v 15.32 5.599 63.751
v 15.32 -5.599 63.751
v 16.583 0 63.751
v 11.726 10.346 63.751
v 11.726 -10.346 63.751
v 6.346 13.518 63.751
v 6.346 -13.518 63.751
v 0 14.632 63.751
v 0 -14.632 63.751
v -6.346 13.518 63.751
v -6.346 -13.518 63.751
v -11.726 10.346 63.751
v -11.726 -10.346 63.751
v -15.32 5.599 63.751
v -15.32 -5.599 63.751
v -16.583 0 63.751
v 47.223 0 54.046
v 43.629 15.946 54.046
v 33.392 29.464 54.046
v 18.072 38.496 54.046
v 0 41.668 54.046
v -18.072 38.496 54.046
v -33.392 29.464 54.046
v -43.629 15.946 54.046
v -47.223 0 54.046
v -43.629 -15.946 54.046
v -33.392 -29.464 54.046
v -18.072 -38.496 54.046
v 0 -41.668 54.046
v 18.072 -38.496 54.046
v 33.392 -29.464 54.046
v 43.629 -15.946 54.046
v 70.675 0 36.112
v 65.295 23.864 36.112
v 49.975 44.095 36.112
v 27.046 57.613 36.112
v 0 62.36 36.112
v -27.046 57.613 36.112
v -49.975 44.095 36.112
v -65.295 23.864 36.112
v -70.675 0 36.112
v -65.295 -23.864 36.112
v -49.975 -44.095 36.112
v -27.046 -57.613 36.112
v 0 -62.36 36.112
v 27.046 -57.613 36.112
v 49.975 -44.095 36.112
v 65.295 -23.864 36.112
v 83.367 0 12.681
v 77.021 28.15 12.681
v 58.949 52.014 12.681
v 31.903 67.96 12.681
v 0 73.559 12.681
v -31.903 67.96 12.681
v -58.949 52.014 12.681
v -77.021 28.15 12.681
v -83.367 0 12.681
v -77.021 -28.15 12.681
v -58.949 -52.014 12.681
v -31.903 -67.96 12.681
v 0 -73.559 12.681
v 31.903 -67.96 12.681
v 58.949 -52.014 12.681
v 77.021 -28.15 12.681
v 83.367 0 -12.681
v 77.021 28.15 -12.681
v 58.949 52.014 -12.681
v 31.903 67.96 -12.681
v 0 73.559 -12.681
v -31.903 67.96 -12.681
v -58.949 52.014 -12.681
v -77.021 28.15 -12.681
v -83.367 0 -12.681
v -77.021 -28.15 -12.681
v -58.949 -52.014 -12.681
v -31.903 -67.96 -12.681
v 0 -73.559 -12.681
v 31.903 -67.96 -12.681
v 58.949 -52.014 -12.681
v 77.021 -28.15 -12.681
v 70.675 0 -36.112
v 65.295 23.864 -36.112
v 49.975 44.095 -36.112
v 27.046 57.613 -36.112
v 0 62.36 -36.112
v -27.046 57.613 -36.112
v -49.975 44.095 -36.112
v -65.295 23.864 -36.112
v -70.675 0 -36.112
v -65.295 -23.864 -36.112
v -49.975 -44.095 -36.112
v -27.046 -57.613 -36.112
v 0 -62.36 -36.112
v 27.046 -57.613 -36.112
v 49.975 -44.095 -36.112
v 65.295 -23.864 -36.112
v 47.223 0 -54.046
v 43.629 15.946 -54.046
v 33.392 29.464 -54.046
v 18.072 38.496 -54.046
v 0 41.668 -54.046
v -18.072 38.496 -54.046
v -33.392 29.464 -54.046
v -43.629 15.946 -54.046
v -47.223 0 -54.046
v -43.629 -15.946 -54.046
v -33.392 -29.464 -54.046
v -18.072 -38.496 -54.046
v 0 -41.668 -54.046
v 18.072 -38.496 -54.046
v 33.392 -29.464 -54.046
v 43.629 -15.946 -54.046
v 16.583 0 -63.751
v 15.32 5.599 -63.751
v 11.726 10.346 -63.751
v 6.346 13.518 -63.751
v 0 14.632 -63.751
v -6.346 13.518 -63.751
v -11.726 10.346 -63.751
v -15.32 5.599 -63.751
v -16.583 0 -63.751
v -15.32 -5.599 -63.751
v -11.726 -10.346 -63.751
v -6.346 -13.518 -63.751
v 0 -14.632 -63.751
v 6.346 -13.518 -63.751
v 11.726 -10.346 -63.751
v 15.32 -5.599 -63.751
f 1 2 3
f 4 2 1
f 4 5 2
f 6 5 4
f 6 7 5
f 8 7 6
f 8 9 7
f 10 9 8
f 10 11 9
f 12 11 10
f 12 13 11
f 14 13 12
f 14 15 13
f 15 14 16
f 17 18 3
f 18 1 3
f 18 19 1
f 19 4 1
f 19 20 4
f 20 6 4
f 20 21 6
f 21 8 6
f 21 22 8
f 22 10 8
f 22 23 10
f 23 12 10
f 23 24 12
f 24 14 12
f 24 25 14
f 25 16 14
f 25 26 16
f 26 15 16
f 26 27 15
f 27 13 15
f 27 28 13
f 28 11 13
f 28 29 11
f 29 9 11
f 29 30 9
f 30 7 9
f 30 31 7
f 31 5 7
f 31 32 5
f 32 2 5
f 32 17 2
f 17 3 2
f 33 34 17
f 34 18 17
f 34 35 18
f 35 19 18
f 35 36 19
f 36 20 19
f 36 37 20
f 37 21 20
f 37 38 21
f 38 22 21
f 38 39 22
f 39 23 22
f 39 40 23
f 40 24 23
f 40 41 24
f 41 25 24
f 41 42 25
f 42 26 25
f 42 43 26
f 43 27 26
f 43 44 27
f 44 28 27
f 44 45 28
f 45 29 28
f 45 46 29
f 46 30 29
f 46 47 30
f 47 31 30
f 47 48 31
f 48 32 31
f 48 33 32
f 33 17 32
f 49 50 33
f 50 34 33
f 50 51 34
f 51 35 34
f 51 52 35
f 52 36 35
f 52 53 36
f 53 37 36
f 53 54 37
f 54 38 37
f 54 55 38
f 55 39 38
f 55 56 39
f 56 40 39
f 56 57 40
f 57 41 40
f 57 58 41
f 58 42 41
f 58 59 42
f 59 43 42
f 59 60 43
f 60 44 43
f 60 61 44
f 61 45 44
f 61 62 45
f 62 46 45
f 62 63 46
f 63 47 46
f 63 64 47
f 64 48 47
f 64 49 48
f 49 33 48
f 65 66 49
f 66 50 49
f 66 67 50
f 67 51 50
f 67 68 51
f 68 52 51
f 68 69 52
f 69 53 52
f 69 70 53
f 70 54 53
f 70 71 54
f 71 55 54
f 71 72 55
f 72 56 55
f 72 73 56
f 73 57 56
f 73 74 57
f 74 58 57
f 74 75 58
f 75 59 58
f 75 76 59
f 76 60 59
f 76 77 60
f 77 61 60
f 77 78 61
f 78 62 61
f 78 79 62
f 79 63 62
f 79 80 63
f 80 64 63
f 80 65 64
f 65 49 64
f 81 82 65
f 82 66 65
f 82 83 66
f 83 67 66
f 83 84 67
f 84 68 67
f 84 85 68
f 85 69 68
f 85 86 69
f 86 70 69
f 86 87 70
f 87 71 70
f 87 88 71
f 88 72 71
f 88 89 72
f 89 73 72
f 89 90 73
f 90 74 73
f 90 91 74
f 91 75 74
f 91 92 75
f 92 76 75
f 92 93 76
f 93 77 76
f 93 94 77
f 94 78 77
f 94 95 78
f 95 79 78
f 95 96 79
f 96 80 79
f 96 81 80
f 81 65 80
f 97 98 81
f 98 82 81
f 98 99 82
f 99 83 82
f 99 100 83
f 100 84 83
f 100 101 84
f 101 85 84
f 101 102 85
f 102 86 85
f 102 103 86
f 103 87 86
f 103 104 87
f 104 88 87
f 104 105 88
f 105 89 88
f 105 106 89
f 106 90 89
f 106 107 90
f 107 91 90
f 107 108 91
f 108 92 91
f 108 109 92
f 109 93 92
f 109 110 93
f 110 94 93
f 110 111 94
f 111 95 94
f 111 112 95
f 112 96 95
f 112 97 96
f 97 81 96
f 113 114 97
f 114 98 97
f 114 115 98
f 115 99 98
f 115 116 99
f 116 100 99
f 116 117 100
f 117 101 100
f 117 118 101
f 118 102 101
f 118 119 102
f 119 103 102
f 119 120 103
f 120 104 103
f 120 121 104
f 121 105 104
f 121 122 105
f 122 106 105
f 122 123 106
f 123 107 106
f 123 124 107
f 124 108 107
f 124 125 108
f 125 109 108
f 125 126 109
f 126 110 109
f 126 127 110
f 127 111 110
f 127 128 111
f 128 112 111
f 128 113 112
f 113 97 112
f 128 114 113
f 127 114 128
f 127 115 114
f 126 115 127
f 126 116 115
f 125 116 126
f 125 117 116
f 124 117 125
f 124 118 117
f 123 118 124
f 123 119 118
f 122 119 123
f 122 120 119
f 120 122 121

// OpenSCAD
// Generated by SolidPython 1.0.1 on 2020-07-29 00:46:53


scale(v = [17, 15, 13]) {
	sphere(r = 5);
}
/***********************************************
*********      SolidPython code:      **********
************************************************
 
# import packages: SolidPython
from solid import *
from solid.utils import *
from itertools import chain, combinations, permutations


class Resize:

    def __init__(self, scad_file):
        self.scad_file = scad_file
        #self.scad_file = import_scad(scad_file)
        # cone/cylinder param:
        self.r1 = 0
        self.r2 = 0
        self.h = 0
        # rectangular prism param:
        self.w = 0
        self.l = 0
        # ellipse param:
        self.r = 0

    # import OpenScad code (file name corresponds to shape)


    # classify shape + parameters
    def assign(self, param1, param2, param3):
        if self.scad_file == 'cone.scad':
            self.r1 = param1
            self.r2 = param2
            self.h = param3
        elif self.scad_file == 'cylinder.scad':
            self.r1 = param1
            self.r2 = param2
            self.h = param3
        elif self.scad_file == 'rectangularPrism.scad':
            self.h = param1
            self.l = param2
            self.w = param3
        else:
            self.r = param1
            self.h = param2

    # resize parameters
    def iterate(self):
        x = range(3, 20, 2)
        i = 1
        if self.scad_file == 'cone.scad':
            tempList = list(permutations(x, 2))
            for temp in tempList:
                param1 = temp[0]
                param2 = temp[1]
                filepath = 'produced_scad_files/' + 'cone' + str(param1) + '_' + str(param2) + '_' + '.scad'
                scad_render_to_file(cylinder(h=param1, r1=param2, r2=0), filepath)

        elif self.scad_file == 'cylinder.scad':
            tempList = list(permutations(x, 3))
            for temp in tempList:
                param1 = temp[0]
                param2 = temp[1]
                filepath = 'produced_scad_files/' + 'cylinder' + str(param1) + '_' + str(param2) + '_' + '.scad'
                scad_render_to_file(cylinder(h=param1, r1=param2, r2=param2), filepath)

        elif self.scad_file == 'rectangularPrism.scad':
            tempList = list(permutations(x, 3))
            for temp in tempList:
                param1 = temp[0]
                param2 = temp[1]
                param3 = temp[2]
                filepath = 'produced_scad_files/' + 'rectangularPrism' + str(param1) + '_' + str(param2) + '_' + str(
                    param3) + '.scad'
                scad_render_to_file(cube(size=(param1, param2, param3)), filepath)

        elif self.scad_file == 'ellipse.scad':
            tempList = list(permutations(x, 4))
            for temp in tempList:
                param1 = temp[0]
                param2 = temp[1]
                param3 = temp[2]
                param4 = temp[3]
                filepath = 'produced_scad_files/' + 'ellipse' + str(param1) + '_' + str(param2) + '_' + str(param3) + '_' + str(param4) + '.scad'
                scad_render_to_file(scale([param1, param2, param3])(sphere(r=param4)), filepath)

    def render_to_scadfile(self):
        scad_render_to_file(scad, 'example.scad') 
 
************************************************/
